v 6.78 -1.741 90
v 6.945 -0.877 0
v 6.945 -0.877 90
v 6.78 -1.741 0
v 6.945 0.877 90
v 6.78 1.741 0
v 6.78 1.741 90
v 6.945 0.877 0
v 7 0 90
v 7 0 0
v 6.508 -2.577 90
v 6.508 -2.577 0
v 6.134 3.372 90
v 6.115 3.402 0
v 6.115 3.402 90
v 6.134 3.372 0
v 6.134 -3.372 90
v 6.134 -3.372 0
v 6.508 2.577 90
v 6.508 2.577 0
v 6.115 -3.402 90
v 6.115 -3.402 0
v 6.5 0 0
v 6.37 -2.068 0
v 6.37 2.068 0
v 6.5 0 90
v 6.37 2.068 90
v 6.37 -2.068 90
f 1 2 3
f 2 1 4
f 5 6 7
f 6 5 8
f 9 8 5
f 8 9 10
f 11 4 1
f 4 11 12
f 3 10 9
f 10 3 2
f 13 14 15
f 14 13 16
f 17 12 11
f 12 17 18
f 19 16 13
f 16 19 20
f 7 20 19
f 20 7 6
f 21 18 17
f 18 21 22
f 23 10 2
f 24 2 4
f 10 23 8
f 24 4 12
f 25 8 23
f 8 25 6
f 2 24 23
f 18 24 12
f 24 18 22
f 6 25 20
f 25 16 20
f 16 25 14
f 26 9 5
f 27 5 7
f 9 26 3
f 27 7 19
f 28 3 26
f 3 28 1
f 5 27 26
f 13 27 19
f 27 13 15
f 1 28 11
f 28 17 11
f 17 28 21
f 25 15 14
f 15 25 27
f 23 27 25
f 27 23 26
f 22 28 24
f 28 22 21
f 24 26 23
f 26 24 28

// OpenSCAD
$fn = 50;


difference() {
	union() {
		cylinder(h = 90, r = 7.0000000000);
		translate(v = [-13.0000000000, 0, 0]) {
			cylinder(h = 90, r = 7.0000000000);
		}
	}
	union() {
		cylinder(h = 90, r = 3.2500000000);
		cylinder(h = 90, r = 1.8000000000);
		cylinder(h = 90, r = 1.8000000000);
		cylinder(h = 90, r = 1.8000000000);
		translate(v = [-17.5000000000, 0, 0]) {
			hull() {
				translate(v = [-3.7500000000, 0.0000000000, 0]) {
					cylinder(h = 90, r = 10.5000000000);
				}
				translate(v = [3.7500000000, 0.0000000000, 0]) {
					cylinder(h = 90, r = 10.5000000000);
				}
				translate(v = [-3.7500000000, -0.0000000000, 0]) {
					cylinder(h = 90, r = 10.5000000000);
				}
				translate(v = [3.7500000000, -0.0000000000, 0]) {
					cylinder(h = 90, r = 10.5000000000);
				}
			}
		}
		translate(v = [-10.0000000000, 0, 0.0000000000]) {
			cylinder(h = 90, r = 16.5000000000);
		}
	}
}
